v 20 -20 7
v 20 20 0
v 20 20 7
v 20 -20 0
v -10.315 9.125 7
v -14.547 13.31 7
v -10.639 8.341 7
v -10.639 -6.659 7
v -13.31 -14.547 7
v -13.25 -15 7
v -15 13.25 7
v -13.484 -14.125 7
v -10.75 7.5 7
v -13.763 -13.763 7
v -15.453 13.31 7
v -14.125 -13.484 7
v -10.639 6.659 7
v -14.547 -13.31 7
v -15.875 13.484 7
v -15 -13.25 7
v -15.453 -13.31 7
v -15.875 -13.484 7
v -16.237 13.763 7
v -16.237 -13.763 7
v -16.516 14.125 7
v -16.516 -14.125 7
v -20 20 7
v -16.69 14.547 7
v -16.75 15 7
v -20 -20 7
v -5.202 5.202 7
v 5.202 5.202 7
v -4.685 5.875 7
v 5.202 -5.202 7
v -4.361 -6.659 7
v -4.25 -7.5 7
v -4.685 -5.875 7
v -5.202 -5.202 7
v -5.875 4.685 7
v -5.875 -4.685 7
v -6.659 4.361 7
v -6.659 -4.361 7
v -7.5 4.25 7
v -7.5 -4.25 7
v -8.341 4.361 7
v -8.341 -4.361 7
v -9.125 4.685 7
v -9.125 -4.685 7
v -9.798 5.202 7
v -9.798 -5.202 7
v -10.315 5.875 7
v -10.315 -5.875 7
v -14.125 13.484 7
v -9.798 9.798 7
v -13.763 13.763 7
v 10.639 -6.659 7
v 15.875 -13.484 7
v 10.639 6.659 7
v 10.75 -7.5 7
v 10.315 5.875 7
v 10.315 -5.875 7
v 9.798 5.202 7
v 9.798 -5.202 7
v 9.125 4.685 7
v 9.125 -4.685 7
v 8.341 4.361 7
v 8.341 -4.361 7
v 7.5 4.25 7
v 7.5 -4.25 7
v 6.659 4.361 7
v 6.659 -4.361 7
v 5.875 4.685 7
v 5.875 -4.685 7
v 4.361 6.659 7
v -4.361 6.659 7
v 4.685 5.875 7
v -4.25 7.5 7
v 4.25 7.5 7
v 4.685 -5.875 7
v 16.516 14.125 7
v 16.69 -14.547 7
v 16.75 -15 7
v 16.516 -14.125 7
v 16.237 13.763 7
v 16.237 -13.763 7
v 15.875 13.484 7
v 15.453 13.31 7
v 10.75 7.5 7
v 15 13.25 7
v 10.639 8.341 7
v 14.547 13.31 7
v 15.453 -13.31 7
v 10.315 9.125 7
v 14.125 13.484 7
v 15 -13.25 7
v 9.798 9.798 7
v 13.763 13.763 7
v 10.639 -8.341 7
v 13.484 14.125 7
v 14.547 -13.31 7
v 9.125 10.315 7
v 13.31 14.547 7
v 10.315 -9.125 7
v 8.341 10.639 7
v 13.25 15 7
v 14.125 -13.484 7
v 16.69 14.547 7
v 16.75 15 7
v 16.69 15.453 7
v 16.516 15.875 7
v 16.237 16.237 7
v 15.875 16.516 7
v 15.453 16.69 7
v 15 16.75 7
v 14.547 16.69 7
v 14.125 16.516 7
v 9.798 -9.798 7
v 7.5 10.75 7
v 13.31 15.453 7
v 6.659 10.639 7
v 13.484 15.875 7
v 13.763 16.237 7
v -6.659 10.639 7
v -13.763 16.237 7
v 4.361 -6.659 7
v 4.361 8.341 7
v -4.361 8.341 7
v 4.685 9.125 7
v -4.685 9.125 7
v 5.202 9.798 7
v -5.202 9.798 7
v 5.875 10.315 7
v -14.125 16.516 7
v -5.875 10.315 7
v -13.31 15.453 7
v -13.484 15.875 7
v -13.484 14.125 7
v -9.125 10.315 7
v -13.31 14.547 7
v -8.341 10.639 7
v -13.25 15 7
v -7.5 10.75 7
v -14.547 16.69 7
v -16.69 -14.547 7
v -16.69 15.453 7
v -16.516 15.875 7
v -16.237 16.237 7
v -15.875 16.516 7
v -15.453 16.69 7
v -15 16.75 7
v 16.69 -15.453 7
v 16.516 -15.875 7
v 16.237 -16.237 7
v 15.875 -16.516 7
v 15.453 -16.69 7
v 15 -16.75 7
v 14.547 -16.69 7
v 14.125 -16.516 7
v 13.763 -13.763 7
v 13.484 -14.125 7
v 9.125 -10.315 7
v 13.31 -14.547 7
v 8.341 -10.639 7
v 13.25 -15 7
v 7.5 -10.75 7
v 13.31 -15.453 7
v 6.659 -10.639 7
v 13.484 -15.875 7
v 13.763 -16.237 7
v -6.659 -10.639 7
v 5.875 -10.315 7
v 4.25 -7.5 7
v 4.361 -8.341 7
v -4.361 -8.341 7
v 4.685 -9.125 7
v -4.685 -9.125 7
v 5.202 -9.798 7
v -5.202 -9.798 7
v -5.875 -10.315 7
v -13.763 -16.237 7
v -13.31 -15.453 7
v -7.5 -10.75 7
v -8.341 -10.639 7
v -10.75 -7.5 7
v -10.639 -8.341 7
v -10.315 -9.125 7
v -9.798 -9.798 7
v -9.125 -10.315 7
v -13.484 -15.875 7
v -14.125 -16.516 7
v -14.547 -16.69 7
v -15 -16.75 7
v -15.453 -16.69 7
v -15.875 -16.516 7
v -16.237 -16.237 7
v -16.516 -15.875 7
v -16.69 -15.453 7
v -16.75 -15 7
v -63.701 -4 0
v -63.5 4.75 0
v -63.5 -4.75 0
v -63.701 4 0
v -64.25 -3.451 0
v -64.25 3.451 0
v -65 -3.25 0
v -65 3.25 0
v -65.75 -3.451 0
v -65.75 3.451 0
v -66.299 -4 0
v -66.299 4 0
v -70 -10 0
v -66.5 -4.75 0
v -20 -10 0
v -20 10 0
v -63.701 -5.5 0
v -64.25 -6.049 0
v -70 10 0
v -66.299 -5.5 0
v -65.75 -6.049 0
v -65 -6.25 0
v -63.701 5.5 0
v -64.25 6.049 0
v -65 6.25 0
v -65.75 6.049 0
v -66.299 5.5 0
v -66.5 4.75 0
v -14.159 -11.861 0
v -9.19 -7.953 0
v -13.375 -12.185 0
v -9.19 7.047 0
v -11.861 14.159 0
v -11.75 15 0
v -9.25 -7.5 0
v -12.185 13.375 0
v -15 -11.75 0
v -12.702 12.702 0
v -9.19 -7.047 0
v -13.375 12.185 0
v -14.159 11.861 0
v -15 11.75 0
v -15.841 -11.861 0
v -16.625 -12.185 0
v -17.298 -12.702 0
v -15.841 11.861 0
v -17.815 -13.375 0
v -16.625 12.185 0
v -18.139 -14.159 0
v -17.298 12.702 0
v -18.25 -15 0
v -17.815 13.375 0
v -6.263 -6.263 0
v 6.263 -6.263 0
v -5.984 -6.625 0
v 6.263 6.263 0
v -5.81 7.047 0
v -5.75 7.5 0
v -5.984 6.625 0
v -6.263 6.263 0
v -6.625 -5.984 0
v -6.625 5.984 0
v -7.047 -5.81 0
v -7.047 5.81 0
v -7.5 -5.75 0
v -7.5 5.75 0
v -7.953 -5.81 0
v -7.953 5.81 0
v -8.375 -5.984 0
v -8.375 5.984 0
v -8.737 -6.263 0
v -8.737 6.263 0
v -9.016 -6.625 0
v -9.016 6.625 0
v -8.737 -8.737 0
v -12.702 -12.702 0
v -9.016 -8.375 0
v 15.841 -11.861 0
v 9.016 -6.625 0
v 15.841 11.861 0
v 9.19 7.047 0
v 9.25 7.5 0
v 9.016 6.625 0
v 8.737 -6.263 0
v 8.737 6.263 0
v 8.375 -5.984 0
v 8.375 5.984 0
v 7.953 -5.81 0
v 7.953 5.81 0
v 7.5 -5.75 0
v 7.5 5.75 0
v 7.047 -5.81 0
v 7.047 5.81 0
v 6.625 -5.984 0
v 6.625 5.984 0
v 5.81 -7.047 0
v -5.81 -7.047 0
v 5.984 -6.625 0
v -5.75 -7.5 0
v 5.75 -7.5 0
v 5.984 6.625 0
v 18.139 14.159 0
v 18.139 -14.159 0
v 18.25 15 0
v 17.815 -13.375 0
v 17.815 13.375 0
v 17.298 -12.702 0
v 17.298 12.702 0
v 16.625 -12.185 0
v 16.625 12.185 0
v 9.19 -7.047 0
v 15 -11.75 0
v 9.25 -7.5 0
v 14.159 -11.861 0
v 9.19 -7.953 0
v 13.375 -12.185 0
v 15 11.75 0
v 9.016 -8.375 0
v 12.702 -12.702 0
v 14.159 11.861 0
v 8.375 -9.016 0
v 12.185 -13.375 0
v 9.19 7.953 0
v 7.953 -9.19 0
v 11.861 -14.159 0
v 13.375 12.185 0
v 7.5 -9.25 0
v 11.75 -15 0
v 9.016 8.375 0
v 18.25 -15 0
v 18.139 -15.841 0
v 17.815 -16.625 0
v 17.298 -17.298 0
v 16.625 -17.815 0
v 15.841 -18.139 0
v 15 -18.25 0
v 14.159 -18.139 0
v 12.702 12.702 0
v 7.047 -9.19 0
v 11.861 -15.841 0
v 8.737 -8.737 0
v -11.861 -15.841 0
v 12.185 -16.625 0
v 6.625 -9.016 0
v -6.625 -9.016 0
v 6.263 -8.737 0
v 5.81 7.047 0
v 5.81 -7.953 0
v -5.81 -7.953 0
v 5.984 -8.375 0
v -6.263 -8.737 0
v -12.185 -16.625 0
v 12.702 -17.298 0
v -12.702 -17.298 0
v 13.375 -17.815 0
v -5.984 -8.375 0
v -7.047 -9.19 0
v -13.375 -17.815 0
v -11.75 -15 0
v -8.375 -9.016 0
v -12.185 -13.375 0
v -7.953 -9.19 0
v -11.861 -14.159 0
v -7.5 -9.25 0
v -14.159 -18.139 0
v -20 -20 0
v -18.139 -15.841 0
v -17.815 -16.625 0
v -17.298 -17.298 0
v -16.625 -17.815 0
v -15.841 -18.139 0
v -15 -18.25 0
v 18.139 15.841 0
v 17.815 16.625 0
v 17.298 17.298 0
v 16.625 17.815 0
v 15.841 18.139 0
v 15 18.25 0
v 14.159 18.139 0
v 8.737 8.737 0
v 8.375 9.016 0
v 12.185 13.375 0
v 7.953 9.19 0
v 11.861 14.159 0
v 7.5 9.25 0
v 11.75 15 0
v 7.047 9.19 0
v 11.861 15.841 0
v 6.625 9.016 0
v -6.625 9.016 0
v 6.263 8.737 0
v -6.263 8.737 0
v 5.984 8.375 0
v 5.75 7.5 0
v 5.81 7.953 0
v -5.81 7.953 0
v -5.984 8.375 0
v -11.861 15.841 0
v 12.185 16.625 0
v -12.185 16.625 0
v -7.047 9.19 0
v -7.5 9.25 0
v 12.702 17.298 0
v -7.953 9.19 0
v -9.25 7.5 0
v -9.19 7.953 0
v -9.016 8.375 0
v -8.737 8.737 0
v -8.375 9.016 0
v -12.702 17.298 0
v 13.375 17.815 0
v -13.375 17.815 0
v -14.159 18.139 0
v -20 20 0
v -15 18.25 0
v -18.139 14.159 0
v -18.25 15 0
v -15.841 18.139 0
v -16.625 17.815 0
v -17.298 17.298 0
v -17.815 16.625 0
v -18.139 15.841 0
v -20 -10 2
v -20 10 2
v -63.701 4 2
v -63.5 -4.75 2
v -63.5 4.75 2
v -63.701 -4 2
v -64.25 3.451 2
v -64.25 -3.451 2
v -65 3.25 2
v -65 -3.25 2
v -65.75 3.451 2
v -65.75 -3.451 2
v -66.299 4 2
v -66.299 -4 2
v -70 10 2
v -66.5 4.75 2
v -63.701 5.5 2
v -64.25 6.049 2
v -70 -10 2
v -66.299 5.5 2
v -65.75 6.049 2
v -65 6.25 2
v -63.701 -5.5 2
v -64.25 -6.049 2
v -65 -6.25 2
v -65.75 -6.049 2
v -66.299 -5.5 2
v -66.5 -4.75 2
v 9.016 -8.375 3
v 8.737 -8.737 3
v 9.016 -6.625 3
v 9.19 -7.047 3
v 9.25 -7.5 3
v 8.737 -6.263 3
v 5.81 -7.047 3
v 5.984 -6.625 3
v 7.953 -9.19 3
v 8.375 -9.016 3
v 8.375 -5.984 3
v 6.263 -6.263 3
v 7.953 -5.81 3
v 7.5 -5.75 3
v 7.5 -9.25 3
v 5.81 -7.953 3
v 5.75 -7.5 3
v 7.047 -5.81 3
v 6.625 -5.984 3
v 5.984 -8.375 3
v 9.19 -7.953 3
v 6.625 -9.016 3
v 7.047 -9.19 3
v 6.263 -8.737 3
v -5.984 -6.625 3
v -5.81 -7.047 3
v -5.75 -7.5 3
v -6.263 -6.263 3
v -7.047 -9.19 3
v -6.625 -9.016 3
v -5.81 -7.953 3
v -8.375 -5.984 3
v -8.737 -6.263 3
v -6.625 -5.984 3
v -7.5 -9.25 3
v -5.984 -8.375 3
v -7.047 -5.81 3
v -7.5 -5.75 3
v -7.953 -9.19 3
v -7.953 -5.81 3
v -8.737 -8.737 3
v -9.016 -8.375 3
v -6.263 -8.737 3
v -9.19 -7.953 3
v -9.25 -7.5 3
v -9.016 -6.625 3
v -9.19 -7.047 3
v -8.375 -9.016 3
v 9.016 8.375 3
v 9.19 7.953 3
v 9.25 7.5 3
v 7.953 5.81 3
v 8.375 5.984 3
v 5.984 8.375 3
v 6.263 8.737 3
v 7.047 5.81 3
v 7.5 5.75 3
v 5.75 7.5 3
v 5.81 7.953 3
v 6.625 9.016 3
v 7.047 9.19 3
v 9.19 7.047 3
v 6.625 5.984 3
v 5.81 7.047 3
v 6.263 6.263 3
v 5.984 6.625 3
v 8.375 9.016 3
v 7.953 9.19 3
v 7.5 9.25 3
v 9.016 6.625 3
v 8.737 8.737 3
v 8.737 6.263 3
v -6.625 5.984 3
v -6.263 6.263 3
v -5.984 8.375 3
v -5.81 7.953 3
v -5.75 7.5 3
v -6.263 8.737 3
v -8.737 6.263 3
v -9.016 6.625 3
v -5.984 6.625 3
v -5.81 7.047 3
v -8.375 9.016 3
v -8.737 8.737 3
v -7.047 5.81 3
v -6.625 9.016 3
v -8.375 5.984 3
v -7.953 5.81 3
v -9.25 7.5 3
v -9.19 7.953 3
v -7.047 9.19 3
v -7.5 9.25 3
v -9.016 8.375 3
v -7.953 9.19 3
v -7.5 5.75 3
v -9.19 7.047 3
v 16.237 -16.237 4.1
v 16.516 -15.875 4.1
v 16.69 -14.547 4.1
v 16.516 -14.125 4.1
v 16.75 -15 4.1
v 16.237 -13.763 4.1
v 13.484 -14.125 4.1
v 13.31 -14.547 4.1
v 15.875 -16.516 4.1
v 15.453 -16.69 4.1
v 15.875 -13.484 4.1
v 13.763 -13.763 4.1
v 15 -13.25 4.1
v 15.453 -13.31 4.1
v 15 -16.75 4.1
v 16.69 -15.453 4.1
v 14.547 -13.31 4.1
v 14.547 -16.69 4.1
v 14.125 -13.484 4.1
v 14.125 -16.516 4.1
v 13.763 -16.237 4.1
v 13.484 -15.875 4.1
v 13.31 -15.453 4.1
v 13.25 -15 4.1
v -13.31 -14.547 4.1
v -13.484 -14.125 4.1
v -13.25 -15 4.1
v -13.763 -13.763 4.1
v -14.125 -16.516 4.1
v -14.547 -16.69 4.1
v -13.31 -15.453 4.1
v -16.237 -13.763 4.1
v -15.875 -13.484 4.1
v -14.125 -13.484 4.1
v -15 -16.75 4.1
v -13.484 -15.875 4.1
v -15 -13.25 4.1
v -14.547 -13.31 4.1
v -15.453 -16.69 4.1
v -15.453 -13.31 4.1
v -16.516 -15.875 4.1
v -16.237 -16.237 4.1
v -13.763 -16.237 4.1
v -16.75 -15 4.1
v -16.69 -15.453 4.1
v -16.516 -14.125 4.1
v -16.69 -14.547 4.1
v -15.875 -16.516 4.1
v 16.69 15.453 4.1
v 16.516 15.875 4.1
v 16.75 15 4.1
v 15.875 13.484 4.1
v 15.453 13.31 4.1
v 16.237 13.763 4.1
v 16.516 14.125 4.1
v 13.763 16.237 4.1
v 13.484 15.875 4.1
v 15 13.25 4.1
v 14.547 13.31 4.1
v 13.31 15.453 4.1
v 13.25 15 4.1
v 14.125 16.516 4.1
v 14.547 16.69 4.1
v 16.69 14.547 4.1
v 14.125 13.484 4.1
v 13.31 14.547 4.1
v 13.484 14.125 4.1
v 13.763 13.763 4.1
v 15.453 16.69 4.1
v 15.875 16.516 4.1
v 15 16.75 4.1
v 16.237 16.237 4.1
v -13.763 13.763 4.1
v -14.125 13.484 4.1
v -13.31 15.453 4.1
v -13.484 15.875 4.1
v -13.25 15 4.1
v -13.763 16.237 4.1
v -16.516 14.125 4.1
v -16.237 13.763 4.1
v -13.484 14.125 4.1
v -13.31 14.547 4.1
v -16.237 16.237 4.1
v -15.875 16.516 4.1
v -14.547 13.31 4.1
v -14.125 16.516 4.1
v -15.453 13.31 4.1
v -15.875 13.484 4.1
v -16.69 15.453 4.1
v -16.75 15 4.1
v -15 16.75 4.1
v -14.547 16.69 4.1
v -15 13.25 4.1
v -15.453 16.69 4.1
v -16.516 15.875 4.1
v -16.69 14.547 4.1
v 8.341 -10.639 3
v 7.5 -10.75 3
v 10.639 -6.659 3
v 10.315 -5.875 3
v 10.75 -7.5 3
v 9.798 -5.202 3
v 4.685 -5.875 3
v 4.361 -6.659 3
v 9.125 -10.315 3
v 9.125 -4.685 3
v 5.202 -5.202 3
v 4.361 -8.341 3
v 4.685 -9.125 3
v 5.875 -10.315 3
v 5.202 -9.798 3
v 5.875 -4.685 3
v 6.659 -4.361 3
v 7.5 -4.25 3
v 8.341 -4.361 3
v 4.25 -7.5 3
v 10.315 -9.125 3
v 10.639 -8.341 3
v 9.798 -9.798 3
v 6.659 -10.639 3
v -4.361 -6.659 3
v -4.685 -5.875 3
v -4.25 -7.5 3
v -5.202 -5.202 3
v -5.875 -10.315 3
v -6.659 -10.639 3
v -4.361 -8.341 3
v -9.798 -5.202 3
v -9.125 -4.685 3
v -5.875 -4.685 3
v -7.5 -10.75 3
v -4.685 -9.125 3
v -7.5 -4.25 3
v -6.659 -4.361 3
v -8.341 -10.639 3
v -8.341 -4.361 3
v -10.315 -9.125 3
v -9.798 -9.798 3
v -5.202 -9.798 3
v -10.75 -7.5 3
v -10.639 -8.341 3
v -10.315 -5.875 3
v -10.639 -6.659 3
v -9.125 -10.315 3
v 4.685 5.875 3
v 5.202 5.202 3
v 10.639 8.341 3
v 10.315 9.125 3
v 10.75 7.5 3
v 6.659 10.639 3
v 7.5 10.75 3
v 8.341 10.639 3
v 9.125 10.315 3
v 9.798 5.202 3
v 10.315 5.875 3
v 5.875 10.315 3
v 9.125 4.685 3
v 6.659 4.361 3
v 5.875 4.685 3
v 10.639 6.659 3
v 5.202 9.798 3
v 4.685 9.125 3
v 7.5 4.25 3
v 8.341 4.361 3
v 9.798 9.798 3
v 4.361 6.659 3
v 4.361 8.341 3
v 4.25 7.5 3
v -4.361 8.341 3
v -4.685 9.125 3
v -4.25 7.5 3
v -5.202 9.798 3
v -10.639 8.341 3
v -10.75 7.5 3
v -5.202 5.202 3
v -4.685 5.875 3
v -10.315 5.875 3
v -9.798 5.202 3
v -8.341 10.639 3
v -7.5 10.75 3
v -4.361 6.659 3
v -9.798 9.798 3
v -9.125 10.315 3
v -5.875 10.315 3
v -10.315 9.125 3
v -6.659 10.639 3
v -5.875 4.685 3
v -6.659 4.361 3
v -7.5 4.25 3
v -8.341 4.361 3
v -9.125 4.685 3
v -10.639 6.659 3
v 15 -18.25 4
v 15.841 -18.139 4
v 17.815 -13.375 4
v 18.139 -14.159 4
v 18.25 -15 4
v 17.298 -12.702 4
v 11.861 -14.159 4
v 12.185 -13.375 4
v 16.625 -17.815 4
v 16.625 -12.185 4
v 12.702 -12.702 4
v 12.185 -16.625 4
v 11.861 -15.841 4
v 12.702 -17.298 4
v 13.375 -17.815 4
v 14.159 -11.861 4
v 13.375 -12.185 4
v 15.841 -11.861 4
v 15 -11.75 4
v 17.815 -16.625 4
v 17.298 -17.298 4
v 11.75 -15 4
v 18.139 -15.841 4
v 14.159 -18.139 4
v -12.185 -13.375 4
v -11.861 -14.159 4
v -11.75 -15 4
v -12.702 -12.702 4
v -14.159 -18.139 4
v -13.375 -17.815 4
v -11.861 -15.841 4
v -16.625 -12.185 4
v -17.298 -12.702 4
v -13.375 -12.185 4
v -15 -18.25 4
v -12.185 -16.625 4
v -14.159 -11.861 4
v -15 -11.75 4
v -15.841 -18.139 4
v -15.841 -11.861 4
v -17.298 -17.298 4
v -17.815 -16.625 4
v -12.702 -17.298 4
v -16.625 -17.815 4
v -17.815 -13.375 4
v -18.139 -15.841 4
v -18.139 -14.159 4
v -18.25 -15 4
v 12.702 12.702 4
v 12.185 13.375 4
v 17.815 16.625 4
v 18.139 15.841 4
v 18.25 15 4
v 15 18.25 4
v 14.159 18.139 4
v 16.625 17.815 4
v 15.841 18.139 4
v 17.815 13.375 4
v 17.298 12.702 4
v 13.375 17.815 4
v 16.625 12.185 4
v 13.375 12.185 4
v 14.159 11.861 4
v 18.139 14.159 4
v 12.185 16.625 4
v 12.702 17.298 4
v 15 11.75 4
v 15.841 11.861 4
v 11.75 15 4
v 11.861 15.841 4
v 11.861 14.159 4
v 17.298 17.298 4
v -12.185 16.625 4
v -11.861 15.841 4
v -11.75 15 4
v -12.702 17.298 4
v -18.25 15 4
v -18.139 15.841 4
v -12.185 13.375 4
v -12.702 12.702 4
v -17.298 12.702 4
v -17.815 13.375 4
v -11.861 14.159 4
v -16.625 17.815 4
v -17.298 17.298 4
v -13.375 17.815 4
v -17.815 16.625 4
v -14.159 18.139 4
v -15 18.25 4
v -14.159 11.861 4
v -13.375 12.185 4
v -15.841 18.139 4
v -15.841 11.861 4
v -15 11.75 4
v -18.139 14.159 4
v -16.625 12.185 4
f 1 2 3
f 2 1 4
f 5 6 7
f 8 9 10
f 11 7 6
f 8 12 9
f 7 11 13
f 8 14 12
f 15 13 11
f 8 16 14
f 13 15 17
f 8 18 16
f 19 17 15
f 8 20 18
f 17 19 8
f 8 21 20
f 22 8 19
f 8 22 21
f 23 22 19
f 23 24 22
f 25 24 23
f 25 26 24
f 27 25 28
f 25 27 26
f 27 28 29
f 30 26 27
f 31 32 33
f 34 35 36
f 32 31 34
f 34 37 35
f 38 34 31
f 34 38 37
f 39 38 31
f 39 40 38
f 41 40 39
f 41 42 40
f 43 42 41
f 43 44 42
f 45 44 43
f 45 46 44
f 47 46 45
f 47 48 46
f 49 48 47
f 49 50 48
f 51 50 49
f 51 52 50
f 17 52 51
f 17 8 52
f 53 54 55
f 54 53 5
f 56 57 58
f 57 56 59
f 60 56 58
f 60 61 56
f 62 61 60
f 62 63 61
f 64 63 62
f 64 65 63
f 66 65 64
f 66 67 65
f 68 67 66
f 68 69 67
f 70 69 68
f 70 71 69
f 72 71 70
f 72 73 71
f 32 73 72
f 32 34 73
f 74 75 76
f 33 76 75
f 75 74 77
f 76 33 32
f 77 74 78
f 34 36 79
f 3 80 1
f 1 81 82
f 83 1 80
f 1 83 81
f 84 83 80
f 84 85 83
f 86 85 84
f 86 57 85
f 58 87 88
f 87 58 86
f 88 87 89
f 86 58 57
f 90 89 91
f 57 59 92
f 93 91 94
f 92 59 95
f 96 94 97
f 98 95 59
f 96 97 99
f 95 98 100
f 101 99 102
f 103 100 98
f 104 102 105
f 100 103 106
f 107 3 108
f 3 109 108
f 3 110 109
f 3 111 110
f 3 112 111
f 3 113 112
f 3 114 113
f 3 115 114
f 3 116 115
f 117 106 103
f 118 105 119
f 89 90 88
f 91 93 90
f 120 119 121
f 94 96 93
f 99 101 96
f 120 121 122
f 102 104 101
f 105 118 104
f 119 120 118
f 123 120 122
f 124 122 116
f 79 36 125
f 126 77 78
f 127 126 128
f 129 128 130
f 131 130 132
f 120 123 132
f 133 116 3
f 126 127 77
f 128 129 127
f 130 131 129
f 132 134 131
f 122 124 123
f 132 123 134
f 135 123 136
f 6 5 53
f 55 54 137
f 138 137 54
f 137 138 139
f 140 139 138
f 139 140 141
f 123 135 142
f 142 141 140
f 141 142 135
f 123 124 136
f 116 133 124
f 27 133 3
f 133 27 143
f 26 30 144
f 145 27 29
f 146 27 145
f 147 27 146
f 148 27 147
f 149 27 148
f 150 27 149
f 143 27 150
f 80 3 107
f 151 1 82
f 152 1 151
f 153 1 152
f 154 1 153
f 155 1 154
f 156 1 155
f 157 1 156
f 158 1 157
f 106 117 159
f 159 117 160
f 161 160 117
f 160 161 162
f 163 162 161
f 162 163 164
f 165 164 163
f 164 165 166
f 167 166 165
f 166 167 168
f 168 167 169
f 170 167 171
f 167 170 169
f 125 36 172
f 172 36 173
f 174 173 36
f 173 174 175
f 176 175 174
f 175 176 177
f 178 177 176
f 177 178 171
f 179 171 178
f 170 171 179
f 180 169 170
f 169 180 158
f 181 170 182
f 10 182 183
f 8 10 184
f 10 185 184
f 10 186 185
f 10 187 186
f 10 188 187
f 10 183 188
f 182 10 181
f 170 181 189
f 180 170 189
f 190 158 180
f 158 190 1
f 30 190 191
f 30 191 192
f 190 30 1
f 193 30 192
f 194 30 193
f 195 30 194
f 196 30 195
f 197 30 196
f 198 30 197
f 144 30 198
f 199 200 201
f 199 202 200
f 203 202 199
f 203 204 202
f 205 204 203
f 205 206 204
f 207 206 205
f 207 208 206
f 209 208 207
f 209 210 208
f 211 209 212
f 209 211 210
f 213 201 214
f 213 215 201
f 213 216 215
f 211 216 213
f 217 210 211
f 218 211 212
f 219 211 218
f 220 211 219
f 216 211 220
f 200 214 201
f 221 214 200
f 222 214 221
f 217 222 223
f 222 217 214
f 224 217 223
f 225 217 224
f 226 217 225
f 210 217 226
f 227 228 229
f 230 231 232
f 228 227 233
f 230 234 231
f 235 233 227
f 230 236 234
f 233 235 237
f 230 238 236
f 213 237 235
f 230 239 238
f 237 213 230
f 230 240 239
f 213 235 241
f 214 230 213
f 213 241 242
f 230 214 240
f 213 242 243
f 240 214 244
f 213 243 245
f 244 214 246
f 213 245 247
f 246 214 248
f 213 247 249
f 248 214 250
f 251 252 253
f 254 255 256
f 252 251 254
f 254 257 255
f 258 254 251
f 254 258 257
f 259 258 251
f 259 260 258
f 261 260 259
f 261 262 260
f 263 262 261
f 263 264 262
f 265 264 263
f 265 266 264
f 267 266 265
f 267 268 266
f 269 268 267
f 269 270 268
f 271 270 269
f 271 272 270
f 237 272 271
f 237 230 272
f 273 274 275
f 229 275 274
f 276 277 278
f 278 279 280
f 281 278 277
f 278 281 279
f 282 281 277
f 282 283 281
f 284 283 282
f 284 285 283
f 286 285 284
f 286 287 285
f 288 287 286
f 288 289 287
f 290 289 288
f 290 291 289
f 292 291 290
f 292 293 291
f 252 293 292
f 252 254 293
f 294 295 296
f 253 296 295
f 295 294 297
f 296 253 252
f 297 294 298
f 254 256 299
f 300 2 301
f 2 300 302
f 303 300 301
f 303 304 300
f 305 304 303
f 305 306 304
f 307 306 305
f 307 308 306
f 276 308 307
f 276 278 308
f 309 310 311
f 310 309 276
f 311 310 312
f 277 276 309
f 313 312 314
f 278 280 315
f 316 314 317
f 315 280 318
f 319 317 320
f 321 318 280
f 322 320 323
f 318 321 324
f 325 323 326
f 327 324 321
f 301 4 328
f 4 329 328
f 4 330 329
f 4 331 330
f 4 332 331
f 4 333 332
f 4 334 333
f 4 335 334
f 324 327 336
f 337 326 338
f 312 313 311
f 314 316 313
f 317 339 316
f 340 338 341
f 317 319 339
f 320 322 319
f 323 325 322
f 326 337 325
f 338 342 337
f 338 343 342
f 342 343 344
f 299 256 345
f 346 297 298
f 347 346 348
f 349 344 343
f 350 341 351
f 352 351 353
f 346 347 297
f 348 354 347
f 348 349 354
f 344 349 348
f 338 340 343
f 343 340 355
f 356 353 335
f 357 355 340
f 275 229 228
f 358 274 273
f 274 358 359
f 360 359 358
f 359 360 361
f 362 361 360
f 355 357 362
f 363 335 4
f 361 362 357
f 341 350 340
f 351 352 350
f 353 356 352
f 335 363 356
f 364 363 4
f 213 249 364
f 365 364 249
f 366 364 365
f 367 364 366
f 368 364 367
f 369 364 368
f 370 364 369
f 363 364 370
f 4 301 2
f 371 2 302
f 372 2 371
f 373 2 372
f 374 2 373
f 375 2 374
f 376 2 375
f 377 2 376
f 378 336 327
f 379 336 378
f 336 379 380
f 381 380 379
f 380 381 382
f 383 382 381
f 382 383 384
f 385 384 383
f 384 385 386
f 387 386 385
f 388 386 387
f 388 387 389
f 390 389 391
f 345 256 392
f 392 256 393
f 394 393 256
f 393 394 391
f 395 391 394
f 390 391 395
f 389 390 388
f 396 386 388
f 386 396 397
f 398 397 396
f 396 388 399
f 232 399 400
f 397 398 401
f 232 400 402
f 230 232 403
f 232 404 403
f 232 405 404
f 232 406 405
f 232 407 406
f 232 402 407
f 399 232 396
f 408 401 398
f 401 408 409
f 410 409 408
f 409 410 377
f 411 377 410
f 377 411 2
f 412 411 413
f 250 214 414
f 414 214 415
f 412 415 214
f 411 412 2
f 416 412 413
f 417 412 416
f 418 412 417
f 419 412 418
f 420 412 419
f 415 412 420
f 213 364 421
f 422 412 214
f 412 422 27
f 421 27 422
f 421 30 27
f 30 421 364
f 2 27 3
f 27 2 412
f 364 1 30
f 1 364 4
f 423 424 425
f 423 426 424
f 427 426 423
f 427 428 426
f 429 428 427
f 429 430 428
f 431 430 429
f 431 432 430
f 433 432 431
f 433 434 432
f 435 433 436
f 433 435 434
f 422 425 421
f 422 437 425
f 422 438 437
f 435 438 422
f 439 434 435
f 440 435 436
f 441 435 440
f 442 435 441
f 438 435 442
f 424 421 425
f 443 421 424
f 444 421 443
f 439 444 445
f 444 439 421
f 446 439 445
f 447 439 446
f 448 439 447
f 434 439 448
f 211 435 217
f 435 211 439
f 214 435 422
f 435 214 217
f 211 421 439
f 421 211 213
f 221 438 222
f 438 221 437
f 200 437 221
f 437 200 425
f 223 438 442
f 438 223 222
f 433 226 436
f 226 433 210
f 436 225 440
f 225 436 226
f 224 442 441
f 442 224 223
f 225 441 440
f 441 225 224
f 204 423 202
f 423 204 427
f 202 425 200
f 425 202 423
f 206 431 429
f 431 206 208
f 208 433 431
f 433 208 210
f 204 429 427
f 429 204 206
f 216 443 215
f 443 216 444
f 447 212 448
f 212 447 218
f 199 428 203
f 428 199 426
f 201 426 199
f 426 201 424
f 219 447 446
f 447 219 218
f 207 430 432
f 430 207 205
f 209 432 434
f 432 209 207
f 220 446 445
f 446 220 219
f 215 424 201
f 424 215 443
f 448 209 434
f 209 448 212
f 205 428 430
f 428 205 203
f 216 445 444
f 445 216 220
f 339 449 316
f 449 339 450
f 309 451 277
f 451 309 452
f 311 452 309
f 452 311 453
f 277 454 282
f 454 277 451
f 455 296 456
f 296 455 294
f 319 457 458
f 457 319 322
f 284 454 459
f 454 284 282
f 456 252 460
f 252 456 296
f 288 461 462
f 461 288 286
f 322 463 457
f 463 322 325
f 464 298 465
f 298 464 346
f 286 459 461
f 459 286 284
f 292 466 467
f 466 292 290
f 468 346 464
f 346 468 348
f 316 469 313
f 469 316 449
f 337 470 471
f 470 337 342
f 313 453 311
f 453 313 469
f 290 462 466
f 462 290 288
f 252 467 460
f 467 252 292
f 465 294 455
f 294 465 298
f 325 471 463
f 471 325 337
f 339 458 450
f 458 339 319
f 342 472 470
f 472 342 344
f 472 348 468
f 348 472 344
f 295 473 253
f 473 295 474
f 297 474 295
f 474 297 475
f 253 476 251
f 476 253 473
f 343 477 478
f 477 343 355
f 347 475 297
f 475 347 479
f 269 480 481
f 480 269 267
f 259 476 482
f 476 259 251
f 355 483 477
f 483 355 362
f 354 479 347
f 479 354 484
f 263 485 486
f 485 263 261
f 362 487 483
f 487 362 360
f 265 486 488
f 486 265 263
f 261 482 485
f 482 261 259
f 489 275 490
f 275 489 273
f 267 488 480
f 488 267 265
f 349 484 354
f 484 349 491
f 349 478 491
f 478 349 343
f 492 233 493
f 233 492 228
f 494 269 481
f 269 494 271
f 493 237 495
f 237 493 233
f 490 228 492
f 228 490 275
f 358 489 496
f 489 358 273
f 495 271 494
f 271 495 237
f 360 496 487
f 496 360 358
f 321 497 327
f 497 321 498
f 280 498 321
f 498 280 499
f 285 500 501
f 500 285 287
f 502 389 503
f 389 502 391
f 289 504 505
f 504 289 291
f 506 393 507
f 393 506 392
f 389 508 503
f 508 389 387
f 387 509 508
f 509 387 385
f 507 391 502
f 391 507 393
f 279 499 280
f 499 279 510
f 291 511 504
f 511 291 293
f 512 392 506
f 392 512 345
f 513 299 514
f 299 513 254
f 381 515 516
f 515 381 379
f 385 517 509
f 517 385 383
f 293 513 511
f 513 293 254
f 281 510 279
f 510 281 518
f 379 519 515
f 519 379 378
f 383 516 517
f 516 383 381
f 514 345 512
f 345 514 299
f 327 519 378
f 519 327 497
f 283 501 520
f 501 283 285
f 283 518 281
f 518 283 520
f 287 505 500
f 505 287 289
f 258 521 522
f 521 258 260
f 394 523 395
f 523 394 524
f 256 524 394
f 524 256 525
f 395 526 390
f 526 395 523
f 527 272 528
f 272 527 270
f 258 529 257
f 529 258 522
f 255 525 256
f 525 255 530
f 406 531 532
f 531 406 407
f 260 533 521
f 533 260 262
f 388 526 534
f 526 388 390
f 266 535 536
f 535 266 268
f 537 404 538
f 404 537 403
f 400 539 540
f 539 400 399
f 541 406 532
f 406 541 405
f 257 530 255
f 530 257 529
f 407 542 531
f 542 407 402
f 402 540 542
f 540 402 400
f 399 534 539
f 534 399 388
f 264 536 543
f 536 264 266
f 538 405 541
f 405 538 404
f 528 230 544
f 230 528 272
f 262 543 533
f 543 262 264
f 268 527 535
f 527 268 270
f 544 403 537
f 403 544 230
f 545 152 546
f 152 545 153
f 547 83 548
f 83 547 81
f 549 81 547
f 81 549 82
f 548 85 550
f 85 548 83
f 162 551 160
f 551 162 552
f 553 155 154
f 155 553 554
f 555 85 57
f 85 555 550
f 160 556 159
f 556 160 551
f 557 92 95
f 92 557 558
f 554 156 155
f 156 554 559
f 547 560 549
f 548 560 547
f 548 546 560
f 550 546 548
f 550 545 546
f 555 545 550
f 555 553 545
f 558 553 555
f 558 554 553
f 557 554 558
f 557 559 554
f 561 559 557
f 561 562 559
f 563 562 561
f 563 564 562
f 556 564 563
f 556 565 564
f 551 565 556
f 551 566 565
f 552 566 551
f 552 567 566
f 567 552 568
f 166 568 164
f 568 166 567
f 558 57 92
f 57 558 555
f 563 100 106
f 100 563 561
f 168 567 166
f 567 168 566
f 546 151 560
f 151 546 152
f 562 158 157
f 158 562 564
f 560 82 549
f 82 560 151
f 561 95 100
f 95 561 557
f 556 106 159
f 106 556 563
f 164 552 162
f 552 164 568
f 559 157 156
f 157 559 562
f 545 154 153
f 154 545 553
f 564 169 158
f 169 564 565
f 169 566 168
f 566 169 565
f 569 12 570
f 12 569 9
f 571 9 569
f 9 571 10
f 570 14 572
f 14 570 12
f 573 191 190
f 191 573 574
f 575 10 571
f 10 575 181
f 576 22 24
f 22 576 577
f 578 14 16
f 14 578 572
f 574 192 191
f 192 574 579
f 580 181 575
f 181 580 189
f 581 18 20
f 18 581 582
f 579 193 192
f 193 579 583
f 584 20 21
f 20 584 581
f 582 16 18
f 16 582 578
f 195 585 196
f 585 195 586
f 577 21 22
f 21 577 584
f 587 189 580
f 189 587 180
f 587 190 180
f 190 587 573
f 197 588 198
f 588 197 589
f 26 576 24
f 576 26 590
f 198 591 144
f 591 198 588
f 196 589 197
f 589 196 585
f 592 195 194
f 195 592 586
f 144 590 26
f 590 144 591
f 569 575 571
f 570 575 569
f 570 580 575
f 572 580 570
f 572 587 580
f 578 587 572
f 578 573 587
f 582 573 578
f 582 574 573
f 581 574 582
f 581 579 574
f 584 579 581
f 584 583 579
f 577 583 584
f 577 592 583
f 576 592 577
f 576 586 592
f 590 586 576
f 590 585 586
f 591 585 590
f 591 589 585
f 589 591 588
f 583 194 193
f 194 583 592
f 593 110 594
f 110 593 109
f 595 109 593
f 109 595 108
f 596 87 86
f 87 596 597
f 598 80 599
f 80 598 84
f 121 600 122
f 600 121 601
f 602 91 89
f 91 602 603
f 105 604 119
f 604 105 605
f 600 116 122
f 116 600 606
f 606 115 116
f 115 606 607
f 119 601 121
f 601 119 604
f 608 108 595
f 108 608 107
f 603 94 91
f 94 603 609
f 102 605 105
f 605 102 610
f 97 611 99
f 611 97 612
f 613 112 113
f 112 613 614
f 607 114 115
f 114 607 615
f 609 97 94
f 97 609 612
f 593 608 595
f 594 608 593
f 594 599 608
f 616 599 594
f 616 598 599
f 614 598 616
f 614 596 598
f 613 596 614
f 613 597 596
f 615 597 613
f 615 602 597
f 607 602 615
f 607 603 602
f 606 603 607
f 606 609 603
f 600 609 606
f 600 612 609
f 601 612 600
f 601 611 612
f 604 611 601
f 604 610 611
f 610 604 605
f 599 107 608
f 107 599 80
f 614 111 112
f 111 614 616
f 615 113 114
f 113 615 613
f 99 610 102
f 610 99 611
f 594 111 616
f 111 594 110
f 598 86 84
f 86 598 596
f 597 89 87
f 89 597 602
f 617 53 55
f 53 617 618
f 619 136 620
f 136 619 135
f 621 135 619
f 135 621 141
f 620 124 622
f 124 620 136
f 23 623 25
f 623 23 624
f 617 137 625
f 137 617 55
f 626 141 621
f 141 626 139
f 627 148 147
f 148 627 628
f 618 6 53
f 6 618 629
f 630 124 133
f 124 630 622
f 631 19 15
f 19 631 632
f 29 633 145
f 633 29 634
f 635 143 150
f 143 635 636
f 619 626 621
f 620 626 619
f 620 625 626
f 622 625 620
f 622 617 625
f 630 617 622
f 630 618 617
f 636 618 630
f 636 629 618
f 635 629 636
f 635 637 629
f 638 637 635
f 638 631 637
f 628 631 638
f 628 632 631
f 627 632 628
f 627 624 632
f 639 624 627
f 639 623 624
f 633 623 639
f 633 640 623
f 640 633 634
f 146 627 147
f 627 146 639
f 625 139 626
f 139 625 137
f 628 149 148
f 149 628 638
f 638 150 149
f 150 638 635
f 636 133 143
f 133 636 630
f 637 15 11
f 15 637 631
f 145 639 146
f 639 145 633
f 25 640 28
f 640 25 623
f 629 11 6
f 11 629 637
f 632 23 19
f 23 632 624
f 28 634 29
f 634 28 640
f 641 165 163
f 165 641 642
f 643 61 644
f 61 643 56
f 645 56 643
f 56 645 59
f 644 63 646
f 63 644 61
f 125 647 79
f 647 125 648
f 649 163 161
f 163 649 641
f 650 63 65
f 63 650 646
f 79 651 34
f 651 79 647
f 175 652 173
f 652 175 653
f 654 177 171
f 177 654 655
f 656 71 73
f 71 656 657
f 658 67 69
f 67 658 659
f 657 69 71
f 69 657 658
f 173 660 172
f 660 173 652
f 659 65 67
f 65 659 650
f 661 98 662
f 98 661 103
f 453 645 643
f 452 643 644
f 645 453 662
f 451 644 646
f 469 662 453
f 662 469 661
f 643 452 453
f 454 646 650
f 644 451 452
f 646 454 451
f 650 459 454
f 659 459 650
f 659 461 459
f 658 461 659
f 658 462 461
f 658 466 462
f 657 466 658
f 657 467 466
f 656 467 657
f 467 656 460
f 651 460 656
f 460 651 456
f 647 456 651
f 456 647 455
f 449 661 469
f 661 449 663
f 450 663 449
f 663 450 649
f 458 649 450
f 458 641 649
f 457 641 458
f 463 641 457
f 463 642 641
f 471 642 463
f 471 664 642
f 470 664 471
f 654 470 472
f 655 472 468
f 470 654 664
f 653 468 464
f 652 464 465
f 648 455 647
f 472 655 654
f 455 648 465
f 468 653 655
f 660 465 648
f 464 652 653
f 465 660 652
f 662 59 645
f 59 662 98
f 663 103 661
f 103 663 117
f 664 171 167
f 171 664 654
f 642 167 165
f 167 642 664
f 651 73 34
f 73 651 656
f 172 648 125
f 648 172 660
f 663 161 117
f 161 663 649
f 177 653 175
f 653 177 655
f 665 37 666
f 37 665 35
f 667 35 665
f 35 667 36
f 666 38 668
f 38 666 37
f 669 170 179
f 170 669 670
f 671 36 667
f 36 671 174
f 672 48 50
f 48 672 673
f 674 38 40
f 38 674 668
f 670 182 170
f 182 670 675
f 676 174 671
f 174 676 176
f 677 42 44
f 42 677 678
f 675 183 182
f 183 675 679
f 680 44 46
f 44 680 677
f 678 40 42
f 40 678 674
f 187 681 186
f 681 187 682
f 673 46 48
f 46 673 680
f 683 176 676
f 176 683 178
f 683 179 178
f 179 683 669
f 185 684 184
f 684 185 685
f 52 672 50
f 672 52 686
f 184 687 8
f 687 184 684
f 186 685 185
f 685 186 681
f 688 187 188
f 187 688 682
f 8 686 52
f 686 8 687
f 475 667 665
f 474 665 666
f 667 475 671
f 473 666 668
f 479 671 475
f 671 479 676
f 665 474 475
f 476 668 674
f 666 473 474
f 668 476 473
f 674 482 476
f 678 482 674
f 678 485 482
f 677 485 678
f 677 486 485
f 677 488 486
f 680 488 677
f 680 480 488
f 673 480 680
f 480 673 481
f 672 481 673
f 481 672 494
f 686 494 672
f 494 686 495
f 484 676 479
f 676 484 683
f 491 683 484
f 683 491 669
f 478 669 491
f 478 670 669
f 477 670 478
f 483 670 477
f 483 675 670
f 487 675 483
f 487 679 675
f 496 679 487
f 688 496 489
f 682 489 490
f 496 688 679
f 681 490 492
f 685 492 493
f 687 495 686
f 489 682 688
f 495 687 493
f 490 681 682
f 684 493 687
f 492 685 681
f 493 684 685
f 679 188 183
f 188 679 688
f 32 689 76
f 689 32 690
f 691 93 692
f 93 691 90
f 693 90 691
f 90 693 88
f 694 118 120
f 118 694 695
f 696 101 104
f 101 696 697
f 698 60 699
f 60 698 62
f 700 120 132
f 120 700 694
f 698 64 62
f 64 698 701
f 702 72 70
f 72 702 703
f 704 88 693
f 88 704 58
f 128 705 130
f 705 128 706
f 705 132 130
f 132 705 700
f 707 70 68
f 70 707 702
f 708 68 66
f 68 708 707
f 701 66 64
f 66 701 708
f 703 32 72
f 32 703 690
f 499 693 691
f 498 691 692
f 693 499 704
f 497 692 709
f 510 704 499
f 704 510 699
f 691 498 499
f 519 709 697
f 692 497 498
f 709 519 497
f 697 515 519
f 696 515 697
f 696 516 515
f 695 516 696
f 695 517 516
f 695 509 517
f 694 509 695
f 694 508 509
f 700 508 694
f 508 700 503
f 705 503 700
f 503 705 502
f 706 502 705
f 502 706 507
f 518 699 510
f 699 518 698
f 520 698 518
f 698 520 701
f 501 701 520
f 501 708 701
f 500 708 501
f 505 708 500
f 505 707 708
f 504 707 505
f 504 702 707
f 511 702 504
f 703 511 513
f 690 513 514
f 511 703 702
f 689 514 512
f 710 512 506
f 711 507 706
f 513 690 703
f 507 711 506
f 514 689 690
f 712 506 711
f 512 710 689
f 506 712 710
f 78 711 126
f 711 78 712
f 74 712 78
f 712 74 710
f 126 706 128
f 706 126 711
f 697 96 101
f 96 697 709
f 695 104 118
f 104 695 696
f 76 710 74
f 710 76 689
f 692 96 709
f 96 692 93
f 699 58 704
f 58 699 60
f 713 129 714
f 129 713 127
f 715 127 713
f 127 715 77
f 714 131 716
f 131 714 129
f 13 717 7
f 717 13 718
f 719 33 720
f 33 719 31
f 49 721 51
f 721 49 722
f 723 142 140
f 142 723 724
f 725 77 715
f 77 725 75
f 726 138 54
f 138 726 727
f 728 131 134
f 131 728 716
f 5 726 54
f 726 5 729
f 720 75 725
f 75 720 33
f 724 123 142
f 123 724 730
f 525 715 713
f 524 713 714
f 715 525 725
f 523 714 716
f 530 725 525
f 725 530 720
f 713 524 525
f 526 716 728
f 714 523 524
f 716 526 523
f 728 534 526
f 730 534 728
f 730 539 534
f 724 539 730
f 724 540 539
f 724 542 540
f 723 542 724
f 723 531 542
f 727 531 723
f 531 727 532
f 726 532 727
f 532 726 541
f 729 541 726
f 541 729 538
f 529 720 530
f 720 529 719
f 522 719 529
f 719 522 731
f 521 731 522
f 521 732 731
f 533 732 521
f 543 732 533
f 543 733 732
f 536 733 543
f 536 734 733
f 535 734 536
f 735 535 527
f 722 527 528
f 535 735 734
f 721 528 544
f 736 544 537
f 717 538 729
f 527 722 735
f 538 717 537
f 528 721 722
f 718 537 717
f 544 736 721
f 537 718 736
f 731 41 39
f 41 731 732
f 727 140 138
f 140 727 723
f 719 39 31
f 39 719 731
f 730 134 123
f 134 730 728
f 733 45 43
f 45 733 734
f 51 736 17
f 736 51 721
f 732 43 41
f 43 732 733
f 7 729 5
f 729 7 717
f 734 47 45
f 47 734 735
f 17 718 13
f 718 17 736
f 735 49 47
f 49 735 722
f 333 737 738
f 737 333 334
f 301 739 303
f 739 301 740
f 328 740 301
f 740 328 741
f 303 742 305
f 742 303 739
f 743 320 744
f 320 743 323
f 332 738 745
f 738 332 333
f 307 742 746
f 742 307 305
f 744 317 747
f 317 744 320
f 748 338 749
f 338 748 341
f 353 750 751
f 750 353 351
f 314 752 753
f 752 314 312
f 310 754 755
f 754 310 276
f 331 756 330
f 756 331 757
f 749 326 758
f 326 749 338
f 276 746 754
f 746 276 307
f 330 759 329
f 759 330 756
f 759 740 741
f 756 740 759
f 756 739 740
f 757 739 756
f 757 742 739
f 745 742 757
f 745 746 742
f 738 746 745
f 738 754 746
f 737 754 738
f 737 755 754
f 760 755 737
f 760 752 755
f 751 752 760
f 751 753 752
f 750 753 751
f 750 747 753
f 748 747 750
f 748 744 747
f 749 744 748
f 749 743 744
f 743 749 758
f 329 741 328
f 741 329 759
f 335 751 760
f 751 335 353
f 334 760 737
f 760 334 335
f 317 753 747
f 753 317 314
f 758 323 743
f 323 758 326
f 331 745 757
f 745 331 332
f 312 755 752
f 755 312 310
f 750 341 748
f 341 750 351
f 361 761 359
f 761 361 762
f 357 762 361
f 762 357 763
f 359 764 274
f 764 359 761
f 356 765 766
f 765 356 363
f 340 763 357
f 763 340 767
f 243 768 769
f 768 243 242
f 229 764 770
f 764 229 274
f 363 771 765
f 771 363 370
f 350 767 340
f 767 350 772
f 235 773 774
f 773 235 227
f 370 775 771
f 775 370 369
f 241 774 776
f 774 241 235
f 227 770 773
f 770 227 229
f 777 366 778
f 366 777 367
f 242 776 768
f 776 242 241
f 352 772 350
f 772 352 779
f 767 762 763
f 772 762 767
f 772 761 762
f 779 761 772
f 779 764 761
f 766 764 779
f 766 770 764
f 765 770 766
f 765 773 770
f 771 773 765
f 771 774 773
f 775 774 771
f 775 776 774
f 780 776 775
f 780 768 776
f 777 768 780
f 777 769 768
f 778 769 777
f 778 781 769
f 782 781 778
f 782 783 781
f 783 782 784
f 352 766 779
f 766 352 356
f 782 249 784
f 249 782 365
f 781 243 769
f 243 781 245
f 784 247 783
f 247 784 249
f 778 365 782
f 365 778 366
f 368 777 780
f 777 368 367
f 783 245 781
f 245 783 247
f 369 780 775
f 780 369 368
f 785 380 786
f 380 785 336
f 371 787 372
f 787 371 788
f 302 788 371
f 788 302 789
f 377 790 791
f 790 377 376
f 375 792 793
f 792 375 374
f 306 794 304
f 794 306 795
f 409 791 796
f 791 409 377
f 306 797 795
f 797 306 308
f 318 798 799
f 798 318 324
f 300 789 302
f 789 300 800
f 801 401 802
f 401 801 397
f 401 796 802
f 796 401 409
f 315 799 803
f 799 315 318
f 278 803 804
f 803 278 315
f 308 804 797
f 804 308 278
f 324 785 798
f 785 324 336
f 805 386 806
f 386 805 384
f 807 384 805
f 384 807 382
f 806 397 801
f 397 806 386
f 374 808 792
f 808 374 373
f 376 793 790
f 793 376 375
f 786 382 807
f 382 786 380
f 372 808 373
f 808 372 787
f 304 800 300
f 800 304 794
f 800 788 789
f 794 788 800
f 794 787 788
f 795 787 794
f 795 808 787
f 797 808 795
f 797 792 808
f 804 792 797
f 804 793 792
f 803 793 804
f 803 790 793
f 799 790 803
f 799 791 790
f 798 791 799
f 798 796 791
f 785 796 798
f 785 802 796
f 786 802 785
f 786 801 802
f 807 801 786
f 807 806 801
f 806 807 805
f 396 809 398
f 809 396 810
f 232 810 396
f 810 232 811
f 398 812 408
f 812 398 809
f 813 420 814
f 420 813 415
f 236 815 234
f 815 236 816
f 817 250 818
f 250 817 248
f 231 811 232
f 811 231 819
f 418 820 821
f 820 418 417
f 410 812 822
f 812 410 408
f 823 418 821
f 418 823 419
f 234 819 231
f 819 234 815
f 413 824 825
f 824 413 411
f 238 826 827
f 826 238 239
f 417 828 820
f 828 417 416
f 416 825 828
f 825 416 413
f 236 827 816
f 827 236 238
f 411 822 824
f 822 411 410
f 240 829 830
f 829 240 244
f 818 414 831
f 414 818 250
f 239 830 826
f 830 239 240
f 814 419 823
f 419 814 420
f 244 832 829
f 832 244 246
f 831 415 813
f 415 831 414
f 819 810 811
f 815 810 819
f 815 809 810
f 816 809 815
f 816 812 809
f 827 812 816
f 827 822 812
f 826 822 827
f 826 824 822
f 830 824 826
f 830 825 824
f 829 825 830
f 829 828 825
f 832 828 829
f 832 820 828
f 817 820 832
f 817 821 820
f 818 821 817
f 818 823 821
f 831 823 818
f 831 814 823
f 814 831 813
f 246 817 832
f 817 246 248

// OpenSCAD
difference()
{
    union()
    {
        translate([-20,-20,0])
            cube([40,40,7]);
        
        translate([-20-50,-10,0])
            cube([50,20,2]);
    }
    union()
    {
        translate([-20-45,9.5/2,0])
                cylinder(d=3,h=10,$fn=12);
        translate([-20-45,-9.5/2,0])
                cylinder(d=3,h=10,$fn=12);
        
        translate([7.5,-7.5,0])
                cylinder(d=3.5,h=10,$fn=24);
        translate([-7.5,-7.5,0])
                cylinder(d=3.5,h=10,$fn=24);
        translate([7.5,7.5,0])
                cylinder(d=3.5,h=10,$fn=24);
        translate([-7.5,7.5,0])
                cylinder(d=3.5,h=10,$fn=24);
        
        translate([15,-15,4.1])
                cylinder(d=3.5,h=10,$fn=24);
        translate([-15,-15,4.1])
                cylinder(d=3.5,h=10,$fn=24);
        translate([15,15,4.1])
                cylinder(d=3.5,h=10,$fn=24);
        translate([-15,15,4.1])
                cylinder(d=3.5,h=10,$fn=24);
        
        
        translate([7.5,-7.5,3])
                cylinder(d=6.5,h=4,$fn=24);
        translate([-7.5,-7.5,3])
                cylinder(d=6.5,h=4,$fn=24);
        translate([7.5,7.5,3])
                cylinder(d=6.5,h=4,$fn=24);
        translate([-7.5,7.5,3])
                cylinder(d=6.5,h=4,$fn=24);
        
        translate([15,-15,0])
                cylinder(d=6.5,h=4,$fn=24);
        translate([-15,-15,0])
                cylinder(d=6.5,h=4,$fn=24);
        translate([15,15,0])
                cylinder(d=6.5,h=4,$fn=24);
        translate([-15,15,0])
                cylinder(d=6.5,h=4,$fn=24);
    }
}
